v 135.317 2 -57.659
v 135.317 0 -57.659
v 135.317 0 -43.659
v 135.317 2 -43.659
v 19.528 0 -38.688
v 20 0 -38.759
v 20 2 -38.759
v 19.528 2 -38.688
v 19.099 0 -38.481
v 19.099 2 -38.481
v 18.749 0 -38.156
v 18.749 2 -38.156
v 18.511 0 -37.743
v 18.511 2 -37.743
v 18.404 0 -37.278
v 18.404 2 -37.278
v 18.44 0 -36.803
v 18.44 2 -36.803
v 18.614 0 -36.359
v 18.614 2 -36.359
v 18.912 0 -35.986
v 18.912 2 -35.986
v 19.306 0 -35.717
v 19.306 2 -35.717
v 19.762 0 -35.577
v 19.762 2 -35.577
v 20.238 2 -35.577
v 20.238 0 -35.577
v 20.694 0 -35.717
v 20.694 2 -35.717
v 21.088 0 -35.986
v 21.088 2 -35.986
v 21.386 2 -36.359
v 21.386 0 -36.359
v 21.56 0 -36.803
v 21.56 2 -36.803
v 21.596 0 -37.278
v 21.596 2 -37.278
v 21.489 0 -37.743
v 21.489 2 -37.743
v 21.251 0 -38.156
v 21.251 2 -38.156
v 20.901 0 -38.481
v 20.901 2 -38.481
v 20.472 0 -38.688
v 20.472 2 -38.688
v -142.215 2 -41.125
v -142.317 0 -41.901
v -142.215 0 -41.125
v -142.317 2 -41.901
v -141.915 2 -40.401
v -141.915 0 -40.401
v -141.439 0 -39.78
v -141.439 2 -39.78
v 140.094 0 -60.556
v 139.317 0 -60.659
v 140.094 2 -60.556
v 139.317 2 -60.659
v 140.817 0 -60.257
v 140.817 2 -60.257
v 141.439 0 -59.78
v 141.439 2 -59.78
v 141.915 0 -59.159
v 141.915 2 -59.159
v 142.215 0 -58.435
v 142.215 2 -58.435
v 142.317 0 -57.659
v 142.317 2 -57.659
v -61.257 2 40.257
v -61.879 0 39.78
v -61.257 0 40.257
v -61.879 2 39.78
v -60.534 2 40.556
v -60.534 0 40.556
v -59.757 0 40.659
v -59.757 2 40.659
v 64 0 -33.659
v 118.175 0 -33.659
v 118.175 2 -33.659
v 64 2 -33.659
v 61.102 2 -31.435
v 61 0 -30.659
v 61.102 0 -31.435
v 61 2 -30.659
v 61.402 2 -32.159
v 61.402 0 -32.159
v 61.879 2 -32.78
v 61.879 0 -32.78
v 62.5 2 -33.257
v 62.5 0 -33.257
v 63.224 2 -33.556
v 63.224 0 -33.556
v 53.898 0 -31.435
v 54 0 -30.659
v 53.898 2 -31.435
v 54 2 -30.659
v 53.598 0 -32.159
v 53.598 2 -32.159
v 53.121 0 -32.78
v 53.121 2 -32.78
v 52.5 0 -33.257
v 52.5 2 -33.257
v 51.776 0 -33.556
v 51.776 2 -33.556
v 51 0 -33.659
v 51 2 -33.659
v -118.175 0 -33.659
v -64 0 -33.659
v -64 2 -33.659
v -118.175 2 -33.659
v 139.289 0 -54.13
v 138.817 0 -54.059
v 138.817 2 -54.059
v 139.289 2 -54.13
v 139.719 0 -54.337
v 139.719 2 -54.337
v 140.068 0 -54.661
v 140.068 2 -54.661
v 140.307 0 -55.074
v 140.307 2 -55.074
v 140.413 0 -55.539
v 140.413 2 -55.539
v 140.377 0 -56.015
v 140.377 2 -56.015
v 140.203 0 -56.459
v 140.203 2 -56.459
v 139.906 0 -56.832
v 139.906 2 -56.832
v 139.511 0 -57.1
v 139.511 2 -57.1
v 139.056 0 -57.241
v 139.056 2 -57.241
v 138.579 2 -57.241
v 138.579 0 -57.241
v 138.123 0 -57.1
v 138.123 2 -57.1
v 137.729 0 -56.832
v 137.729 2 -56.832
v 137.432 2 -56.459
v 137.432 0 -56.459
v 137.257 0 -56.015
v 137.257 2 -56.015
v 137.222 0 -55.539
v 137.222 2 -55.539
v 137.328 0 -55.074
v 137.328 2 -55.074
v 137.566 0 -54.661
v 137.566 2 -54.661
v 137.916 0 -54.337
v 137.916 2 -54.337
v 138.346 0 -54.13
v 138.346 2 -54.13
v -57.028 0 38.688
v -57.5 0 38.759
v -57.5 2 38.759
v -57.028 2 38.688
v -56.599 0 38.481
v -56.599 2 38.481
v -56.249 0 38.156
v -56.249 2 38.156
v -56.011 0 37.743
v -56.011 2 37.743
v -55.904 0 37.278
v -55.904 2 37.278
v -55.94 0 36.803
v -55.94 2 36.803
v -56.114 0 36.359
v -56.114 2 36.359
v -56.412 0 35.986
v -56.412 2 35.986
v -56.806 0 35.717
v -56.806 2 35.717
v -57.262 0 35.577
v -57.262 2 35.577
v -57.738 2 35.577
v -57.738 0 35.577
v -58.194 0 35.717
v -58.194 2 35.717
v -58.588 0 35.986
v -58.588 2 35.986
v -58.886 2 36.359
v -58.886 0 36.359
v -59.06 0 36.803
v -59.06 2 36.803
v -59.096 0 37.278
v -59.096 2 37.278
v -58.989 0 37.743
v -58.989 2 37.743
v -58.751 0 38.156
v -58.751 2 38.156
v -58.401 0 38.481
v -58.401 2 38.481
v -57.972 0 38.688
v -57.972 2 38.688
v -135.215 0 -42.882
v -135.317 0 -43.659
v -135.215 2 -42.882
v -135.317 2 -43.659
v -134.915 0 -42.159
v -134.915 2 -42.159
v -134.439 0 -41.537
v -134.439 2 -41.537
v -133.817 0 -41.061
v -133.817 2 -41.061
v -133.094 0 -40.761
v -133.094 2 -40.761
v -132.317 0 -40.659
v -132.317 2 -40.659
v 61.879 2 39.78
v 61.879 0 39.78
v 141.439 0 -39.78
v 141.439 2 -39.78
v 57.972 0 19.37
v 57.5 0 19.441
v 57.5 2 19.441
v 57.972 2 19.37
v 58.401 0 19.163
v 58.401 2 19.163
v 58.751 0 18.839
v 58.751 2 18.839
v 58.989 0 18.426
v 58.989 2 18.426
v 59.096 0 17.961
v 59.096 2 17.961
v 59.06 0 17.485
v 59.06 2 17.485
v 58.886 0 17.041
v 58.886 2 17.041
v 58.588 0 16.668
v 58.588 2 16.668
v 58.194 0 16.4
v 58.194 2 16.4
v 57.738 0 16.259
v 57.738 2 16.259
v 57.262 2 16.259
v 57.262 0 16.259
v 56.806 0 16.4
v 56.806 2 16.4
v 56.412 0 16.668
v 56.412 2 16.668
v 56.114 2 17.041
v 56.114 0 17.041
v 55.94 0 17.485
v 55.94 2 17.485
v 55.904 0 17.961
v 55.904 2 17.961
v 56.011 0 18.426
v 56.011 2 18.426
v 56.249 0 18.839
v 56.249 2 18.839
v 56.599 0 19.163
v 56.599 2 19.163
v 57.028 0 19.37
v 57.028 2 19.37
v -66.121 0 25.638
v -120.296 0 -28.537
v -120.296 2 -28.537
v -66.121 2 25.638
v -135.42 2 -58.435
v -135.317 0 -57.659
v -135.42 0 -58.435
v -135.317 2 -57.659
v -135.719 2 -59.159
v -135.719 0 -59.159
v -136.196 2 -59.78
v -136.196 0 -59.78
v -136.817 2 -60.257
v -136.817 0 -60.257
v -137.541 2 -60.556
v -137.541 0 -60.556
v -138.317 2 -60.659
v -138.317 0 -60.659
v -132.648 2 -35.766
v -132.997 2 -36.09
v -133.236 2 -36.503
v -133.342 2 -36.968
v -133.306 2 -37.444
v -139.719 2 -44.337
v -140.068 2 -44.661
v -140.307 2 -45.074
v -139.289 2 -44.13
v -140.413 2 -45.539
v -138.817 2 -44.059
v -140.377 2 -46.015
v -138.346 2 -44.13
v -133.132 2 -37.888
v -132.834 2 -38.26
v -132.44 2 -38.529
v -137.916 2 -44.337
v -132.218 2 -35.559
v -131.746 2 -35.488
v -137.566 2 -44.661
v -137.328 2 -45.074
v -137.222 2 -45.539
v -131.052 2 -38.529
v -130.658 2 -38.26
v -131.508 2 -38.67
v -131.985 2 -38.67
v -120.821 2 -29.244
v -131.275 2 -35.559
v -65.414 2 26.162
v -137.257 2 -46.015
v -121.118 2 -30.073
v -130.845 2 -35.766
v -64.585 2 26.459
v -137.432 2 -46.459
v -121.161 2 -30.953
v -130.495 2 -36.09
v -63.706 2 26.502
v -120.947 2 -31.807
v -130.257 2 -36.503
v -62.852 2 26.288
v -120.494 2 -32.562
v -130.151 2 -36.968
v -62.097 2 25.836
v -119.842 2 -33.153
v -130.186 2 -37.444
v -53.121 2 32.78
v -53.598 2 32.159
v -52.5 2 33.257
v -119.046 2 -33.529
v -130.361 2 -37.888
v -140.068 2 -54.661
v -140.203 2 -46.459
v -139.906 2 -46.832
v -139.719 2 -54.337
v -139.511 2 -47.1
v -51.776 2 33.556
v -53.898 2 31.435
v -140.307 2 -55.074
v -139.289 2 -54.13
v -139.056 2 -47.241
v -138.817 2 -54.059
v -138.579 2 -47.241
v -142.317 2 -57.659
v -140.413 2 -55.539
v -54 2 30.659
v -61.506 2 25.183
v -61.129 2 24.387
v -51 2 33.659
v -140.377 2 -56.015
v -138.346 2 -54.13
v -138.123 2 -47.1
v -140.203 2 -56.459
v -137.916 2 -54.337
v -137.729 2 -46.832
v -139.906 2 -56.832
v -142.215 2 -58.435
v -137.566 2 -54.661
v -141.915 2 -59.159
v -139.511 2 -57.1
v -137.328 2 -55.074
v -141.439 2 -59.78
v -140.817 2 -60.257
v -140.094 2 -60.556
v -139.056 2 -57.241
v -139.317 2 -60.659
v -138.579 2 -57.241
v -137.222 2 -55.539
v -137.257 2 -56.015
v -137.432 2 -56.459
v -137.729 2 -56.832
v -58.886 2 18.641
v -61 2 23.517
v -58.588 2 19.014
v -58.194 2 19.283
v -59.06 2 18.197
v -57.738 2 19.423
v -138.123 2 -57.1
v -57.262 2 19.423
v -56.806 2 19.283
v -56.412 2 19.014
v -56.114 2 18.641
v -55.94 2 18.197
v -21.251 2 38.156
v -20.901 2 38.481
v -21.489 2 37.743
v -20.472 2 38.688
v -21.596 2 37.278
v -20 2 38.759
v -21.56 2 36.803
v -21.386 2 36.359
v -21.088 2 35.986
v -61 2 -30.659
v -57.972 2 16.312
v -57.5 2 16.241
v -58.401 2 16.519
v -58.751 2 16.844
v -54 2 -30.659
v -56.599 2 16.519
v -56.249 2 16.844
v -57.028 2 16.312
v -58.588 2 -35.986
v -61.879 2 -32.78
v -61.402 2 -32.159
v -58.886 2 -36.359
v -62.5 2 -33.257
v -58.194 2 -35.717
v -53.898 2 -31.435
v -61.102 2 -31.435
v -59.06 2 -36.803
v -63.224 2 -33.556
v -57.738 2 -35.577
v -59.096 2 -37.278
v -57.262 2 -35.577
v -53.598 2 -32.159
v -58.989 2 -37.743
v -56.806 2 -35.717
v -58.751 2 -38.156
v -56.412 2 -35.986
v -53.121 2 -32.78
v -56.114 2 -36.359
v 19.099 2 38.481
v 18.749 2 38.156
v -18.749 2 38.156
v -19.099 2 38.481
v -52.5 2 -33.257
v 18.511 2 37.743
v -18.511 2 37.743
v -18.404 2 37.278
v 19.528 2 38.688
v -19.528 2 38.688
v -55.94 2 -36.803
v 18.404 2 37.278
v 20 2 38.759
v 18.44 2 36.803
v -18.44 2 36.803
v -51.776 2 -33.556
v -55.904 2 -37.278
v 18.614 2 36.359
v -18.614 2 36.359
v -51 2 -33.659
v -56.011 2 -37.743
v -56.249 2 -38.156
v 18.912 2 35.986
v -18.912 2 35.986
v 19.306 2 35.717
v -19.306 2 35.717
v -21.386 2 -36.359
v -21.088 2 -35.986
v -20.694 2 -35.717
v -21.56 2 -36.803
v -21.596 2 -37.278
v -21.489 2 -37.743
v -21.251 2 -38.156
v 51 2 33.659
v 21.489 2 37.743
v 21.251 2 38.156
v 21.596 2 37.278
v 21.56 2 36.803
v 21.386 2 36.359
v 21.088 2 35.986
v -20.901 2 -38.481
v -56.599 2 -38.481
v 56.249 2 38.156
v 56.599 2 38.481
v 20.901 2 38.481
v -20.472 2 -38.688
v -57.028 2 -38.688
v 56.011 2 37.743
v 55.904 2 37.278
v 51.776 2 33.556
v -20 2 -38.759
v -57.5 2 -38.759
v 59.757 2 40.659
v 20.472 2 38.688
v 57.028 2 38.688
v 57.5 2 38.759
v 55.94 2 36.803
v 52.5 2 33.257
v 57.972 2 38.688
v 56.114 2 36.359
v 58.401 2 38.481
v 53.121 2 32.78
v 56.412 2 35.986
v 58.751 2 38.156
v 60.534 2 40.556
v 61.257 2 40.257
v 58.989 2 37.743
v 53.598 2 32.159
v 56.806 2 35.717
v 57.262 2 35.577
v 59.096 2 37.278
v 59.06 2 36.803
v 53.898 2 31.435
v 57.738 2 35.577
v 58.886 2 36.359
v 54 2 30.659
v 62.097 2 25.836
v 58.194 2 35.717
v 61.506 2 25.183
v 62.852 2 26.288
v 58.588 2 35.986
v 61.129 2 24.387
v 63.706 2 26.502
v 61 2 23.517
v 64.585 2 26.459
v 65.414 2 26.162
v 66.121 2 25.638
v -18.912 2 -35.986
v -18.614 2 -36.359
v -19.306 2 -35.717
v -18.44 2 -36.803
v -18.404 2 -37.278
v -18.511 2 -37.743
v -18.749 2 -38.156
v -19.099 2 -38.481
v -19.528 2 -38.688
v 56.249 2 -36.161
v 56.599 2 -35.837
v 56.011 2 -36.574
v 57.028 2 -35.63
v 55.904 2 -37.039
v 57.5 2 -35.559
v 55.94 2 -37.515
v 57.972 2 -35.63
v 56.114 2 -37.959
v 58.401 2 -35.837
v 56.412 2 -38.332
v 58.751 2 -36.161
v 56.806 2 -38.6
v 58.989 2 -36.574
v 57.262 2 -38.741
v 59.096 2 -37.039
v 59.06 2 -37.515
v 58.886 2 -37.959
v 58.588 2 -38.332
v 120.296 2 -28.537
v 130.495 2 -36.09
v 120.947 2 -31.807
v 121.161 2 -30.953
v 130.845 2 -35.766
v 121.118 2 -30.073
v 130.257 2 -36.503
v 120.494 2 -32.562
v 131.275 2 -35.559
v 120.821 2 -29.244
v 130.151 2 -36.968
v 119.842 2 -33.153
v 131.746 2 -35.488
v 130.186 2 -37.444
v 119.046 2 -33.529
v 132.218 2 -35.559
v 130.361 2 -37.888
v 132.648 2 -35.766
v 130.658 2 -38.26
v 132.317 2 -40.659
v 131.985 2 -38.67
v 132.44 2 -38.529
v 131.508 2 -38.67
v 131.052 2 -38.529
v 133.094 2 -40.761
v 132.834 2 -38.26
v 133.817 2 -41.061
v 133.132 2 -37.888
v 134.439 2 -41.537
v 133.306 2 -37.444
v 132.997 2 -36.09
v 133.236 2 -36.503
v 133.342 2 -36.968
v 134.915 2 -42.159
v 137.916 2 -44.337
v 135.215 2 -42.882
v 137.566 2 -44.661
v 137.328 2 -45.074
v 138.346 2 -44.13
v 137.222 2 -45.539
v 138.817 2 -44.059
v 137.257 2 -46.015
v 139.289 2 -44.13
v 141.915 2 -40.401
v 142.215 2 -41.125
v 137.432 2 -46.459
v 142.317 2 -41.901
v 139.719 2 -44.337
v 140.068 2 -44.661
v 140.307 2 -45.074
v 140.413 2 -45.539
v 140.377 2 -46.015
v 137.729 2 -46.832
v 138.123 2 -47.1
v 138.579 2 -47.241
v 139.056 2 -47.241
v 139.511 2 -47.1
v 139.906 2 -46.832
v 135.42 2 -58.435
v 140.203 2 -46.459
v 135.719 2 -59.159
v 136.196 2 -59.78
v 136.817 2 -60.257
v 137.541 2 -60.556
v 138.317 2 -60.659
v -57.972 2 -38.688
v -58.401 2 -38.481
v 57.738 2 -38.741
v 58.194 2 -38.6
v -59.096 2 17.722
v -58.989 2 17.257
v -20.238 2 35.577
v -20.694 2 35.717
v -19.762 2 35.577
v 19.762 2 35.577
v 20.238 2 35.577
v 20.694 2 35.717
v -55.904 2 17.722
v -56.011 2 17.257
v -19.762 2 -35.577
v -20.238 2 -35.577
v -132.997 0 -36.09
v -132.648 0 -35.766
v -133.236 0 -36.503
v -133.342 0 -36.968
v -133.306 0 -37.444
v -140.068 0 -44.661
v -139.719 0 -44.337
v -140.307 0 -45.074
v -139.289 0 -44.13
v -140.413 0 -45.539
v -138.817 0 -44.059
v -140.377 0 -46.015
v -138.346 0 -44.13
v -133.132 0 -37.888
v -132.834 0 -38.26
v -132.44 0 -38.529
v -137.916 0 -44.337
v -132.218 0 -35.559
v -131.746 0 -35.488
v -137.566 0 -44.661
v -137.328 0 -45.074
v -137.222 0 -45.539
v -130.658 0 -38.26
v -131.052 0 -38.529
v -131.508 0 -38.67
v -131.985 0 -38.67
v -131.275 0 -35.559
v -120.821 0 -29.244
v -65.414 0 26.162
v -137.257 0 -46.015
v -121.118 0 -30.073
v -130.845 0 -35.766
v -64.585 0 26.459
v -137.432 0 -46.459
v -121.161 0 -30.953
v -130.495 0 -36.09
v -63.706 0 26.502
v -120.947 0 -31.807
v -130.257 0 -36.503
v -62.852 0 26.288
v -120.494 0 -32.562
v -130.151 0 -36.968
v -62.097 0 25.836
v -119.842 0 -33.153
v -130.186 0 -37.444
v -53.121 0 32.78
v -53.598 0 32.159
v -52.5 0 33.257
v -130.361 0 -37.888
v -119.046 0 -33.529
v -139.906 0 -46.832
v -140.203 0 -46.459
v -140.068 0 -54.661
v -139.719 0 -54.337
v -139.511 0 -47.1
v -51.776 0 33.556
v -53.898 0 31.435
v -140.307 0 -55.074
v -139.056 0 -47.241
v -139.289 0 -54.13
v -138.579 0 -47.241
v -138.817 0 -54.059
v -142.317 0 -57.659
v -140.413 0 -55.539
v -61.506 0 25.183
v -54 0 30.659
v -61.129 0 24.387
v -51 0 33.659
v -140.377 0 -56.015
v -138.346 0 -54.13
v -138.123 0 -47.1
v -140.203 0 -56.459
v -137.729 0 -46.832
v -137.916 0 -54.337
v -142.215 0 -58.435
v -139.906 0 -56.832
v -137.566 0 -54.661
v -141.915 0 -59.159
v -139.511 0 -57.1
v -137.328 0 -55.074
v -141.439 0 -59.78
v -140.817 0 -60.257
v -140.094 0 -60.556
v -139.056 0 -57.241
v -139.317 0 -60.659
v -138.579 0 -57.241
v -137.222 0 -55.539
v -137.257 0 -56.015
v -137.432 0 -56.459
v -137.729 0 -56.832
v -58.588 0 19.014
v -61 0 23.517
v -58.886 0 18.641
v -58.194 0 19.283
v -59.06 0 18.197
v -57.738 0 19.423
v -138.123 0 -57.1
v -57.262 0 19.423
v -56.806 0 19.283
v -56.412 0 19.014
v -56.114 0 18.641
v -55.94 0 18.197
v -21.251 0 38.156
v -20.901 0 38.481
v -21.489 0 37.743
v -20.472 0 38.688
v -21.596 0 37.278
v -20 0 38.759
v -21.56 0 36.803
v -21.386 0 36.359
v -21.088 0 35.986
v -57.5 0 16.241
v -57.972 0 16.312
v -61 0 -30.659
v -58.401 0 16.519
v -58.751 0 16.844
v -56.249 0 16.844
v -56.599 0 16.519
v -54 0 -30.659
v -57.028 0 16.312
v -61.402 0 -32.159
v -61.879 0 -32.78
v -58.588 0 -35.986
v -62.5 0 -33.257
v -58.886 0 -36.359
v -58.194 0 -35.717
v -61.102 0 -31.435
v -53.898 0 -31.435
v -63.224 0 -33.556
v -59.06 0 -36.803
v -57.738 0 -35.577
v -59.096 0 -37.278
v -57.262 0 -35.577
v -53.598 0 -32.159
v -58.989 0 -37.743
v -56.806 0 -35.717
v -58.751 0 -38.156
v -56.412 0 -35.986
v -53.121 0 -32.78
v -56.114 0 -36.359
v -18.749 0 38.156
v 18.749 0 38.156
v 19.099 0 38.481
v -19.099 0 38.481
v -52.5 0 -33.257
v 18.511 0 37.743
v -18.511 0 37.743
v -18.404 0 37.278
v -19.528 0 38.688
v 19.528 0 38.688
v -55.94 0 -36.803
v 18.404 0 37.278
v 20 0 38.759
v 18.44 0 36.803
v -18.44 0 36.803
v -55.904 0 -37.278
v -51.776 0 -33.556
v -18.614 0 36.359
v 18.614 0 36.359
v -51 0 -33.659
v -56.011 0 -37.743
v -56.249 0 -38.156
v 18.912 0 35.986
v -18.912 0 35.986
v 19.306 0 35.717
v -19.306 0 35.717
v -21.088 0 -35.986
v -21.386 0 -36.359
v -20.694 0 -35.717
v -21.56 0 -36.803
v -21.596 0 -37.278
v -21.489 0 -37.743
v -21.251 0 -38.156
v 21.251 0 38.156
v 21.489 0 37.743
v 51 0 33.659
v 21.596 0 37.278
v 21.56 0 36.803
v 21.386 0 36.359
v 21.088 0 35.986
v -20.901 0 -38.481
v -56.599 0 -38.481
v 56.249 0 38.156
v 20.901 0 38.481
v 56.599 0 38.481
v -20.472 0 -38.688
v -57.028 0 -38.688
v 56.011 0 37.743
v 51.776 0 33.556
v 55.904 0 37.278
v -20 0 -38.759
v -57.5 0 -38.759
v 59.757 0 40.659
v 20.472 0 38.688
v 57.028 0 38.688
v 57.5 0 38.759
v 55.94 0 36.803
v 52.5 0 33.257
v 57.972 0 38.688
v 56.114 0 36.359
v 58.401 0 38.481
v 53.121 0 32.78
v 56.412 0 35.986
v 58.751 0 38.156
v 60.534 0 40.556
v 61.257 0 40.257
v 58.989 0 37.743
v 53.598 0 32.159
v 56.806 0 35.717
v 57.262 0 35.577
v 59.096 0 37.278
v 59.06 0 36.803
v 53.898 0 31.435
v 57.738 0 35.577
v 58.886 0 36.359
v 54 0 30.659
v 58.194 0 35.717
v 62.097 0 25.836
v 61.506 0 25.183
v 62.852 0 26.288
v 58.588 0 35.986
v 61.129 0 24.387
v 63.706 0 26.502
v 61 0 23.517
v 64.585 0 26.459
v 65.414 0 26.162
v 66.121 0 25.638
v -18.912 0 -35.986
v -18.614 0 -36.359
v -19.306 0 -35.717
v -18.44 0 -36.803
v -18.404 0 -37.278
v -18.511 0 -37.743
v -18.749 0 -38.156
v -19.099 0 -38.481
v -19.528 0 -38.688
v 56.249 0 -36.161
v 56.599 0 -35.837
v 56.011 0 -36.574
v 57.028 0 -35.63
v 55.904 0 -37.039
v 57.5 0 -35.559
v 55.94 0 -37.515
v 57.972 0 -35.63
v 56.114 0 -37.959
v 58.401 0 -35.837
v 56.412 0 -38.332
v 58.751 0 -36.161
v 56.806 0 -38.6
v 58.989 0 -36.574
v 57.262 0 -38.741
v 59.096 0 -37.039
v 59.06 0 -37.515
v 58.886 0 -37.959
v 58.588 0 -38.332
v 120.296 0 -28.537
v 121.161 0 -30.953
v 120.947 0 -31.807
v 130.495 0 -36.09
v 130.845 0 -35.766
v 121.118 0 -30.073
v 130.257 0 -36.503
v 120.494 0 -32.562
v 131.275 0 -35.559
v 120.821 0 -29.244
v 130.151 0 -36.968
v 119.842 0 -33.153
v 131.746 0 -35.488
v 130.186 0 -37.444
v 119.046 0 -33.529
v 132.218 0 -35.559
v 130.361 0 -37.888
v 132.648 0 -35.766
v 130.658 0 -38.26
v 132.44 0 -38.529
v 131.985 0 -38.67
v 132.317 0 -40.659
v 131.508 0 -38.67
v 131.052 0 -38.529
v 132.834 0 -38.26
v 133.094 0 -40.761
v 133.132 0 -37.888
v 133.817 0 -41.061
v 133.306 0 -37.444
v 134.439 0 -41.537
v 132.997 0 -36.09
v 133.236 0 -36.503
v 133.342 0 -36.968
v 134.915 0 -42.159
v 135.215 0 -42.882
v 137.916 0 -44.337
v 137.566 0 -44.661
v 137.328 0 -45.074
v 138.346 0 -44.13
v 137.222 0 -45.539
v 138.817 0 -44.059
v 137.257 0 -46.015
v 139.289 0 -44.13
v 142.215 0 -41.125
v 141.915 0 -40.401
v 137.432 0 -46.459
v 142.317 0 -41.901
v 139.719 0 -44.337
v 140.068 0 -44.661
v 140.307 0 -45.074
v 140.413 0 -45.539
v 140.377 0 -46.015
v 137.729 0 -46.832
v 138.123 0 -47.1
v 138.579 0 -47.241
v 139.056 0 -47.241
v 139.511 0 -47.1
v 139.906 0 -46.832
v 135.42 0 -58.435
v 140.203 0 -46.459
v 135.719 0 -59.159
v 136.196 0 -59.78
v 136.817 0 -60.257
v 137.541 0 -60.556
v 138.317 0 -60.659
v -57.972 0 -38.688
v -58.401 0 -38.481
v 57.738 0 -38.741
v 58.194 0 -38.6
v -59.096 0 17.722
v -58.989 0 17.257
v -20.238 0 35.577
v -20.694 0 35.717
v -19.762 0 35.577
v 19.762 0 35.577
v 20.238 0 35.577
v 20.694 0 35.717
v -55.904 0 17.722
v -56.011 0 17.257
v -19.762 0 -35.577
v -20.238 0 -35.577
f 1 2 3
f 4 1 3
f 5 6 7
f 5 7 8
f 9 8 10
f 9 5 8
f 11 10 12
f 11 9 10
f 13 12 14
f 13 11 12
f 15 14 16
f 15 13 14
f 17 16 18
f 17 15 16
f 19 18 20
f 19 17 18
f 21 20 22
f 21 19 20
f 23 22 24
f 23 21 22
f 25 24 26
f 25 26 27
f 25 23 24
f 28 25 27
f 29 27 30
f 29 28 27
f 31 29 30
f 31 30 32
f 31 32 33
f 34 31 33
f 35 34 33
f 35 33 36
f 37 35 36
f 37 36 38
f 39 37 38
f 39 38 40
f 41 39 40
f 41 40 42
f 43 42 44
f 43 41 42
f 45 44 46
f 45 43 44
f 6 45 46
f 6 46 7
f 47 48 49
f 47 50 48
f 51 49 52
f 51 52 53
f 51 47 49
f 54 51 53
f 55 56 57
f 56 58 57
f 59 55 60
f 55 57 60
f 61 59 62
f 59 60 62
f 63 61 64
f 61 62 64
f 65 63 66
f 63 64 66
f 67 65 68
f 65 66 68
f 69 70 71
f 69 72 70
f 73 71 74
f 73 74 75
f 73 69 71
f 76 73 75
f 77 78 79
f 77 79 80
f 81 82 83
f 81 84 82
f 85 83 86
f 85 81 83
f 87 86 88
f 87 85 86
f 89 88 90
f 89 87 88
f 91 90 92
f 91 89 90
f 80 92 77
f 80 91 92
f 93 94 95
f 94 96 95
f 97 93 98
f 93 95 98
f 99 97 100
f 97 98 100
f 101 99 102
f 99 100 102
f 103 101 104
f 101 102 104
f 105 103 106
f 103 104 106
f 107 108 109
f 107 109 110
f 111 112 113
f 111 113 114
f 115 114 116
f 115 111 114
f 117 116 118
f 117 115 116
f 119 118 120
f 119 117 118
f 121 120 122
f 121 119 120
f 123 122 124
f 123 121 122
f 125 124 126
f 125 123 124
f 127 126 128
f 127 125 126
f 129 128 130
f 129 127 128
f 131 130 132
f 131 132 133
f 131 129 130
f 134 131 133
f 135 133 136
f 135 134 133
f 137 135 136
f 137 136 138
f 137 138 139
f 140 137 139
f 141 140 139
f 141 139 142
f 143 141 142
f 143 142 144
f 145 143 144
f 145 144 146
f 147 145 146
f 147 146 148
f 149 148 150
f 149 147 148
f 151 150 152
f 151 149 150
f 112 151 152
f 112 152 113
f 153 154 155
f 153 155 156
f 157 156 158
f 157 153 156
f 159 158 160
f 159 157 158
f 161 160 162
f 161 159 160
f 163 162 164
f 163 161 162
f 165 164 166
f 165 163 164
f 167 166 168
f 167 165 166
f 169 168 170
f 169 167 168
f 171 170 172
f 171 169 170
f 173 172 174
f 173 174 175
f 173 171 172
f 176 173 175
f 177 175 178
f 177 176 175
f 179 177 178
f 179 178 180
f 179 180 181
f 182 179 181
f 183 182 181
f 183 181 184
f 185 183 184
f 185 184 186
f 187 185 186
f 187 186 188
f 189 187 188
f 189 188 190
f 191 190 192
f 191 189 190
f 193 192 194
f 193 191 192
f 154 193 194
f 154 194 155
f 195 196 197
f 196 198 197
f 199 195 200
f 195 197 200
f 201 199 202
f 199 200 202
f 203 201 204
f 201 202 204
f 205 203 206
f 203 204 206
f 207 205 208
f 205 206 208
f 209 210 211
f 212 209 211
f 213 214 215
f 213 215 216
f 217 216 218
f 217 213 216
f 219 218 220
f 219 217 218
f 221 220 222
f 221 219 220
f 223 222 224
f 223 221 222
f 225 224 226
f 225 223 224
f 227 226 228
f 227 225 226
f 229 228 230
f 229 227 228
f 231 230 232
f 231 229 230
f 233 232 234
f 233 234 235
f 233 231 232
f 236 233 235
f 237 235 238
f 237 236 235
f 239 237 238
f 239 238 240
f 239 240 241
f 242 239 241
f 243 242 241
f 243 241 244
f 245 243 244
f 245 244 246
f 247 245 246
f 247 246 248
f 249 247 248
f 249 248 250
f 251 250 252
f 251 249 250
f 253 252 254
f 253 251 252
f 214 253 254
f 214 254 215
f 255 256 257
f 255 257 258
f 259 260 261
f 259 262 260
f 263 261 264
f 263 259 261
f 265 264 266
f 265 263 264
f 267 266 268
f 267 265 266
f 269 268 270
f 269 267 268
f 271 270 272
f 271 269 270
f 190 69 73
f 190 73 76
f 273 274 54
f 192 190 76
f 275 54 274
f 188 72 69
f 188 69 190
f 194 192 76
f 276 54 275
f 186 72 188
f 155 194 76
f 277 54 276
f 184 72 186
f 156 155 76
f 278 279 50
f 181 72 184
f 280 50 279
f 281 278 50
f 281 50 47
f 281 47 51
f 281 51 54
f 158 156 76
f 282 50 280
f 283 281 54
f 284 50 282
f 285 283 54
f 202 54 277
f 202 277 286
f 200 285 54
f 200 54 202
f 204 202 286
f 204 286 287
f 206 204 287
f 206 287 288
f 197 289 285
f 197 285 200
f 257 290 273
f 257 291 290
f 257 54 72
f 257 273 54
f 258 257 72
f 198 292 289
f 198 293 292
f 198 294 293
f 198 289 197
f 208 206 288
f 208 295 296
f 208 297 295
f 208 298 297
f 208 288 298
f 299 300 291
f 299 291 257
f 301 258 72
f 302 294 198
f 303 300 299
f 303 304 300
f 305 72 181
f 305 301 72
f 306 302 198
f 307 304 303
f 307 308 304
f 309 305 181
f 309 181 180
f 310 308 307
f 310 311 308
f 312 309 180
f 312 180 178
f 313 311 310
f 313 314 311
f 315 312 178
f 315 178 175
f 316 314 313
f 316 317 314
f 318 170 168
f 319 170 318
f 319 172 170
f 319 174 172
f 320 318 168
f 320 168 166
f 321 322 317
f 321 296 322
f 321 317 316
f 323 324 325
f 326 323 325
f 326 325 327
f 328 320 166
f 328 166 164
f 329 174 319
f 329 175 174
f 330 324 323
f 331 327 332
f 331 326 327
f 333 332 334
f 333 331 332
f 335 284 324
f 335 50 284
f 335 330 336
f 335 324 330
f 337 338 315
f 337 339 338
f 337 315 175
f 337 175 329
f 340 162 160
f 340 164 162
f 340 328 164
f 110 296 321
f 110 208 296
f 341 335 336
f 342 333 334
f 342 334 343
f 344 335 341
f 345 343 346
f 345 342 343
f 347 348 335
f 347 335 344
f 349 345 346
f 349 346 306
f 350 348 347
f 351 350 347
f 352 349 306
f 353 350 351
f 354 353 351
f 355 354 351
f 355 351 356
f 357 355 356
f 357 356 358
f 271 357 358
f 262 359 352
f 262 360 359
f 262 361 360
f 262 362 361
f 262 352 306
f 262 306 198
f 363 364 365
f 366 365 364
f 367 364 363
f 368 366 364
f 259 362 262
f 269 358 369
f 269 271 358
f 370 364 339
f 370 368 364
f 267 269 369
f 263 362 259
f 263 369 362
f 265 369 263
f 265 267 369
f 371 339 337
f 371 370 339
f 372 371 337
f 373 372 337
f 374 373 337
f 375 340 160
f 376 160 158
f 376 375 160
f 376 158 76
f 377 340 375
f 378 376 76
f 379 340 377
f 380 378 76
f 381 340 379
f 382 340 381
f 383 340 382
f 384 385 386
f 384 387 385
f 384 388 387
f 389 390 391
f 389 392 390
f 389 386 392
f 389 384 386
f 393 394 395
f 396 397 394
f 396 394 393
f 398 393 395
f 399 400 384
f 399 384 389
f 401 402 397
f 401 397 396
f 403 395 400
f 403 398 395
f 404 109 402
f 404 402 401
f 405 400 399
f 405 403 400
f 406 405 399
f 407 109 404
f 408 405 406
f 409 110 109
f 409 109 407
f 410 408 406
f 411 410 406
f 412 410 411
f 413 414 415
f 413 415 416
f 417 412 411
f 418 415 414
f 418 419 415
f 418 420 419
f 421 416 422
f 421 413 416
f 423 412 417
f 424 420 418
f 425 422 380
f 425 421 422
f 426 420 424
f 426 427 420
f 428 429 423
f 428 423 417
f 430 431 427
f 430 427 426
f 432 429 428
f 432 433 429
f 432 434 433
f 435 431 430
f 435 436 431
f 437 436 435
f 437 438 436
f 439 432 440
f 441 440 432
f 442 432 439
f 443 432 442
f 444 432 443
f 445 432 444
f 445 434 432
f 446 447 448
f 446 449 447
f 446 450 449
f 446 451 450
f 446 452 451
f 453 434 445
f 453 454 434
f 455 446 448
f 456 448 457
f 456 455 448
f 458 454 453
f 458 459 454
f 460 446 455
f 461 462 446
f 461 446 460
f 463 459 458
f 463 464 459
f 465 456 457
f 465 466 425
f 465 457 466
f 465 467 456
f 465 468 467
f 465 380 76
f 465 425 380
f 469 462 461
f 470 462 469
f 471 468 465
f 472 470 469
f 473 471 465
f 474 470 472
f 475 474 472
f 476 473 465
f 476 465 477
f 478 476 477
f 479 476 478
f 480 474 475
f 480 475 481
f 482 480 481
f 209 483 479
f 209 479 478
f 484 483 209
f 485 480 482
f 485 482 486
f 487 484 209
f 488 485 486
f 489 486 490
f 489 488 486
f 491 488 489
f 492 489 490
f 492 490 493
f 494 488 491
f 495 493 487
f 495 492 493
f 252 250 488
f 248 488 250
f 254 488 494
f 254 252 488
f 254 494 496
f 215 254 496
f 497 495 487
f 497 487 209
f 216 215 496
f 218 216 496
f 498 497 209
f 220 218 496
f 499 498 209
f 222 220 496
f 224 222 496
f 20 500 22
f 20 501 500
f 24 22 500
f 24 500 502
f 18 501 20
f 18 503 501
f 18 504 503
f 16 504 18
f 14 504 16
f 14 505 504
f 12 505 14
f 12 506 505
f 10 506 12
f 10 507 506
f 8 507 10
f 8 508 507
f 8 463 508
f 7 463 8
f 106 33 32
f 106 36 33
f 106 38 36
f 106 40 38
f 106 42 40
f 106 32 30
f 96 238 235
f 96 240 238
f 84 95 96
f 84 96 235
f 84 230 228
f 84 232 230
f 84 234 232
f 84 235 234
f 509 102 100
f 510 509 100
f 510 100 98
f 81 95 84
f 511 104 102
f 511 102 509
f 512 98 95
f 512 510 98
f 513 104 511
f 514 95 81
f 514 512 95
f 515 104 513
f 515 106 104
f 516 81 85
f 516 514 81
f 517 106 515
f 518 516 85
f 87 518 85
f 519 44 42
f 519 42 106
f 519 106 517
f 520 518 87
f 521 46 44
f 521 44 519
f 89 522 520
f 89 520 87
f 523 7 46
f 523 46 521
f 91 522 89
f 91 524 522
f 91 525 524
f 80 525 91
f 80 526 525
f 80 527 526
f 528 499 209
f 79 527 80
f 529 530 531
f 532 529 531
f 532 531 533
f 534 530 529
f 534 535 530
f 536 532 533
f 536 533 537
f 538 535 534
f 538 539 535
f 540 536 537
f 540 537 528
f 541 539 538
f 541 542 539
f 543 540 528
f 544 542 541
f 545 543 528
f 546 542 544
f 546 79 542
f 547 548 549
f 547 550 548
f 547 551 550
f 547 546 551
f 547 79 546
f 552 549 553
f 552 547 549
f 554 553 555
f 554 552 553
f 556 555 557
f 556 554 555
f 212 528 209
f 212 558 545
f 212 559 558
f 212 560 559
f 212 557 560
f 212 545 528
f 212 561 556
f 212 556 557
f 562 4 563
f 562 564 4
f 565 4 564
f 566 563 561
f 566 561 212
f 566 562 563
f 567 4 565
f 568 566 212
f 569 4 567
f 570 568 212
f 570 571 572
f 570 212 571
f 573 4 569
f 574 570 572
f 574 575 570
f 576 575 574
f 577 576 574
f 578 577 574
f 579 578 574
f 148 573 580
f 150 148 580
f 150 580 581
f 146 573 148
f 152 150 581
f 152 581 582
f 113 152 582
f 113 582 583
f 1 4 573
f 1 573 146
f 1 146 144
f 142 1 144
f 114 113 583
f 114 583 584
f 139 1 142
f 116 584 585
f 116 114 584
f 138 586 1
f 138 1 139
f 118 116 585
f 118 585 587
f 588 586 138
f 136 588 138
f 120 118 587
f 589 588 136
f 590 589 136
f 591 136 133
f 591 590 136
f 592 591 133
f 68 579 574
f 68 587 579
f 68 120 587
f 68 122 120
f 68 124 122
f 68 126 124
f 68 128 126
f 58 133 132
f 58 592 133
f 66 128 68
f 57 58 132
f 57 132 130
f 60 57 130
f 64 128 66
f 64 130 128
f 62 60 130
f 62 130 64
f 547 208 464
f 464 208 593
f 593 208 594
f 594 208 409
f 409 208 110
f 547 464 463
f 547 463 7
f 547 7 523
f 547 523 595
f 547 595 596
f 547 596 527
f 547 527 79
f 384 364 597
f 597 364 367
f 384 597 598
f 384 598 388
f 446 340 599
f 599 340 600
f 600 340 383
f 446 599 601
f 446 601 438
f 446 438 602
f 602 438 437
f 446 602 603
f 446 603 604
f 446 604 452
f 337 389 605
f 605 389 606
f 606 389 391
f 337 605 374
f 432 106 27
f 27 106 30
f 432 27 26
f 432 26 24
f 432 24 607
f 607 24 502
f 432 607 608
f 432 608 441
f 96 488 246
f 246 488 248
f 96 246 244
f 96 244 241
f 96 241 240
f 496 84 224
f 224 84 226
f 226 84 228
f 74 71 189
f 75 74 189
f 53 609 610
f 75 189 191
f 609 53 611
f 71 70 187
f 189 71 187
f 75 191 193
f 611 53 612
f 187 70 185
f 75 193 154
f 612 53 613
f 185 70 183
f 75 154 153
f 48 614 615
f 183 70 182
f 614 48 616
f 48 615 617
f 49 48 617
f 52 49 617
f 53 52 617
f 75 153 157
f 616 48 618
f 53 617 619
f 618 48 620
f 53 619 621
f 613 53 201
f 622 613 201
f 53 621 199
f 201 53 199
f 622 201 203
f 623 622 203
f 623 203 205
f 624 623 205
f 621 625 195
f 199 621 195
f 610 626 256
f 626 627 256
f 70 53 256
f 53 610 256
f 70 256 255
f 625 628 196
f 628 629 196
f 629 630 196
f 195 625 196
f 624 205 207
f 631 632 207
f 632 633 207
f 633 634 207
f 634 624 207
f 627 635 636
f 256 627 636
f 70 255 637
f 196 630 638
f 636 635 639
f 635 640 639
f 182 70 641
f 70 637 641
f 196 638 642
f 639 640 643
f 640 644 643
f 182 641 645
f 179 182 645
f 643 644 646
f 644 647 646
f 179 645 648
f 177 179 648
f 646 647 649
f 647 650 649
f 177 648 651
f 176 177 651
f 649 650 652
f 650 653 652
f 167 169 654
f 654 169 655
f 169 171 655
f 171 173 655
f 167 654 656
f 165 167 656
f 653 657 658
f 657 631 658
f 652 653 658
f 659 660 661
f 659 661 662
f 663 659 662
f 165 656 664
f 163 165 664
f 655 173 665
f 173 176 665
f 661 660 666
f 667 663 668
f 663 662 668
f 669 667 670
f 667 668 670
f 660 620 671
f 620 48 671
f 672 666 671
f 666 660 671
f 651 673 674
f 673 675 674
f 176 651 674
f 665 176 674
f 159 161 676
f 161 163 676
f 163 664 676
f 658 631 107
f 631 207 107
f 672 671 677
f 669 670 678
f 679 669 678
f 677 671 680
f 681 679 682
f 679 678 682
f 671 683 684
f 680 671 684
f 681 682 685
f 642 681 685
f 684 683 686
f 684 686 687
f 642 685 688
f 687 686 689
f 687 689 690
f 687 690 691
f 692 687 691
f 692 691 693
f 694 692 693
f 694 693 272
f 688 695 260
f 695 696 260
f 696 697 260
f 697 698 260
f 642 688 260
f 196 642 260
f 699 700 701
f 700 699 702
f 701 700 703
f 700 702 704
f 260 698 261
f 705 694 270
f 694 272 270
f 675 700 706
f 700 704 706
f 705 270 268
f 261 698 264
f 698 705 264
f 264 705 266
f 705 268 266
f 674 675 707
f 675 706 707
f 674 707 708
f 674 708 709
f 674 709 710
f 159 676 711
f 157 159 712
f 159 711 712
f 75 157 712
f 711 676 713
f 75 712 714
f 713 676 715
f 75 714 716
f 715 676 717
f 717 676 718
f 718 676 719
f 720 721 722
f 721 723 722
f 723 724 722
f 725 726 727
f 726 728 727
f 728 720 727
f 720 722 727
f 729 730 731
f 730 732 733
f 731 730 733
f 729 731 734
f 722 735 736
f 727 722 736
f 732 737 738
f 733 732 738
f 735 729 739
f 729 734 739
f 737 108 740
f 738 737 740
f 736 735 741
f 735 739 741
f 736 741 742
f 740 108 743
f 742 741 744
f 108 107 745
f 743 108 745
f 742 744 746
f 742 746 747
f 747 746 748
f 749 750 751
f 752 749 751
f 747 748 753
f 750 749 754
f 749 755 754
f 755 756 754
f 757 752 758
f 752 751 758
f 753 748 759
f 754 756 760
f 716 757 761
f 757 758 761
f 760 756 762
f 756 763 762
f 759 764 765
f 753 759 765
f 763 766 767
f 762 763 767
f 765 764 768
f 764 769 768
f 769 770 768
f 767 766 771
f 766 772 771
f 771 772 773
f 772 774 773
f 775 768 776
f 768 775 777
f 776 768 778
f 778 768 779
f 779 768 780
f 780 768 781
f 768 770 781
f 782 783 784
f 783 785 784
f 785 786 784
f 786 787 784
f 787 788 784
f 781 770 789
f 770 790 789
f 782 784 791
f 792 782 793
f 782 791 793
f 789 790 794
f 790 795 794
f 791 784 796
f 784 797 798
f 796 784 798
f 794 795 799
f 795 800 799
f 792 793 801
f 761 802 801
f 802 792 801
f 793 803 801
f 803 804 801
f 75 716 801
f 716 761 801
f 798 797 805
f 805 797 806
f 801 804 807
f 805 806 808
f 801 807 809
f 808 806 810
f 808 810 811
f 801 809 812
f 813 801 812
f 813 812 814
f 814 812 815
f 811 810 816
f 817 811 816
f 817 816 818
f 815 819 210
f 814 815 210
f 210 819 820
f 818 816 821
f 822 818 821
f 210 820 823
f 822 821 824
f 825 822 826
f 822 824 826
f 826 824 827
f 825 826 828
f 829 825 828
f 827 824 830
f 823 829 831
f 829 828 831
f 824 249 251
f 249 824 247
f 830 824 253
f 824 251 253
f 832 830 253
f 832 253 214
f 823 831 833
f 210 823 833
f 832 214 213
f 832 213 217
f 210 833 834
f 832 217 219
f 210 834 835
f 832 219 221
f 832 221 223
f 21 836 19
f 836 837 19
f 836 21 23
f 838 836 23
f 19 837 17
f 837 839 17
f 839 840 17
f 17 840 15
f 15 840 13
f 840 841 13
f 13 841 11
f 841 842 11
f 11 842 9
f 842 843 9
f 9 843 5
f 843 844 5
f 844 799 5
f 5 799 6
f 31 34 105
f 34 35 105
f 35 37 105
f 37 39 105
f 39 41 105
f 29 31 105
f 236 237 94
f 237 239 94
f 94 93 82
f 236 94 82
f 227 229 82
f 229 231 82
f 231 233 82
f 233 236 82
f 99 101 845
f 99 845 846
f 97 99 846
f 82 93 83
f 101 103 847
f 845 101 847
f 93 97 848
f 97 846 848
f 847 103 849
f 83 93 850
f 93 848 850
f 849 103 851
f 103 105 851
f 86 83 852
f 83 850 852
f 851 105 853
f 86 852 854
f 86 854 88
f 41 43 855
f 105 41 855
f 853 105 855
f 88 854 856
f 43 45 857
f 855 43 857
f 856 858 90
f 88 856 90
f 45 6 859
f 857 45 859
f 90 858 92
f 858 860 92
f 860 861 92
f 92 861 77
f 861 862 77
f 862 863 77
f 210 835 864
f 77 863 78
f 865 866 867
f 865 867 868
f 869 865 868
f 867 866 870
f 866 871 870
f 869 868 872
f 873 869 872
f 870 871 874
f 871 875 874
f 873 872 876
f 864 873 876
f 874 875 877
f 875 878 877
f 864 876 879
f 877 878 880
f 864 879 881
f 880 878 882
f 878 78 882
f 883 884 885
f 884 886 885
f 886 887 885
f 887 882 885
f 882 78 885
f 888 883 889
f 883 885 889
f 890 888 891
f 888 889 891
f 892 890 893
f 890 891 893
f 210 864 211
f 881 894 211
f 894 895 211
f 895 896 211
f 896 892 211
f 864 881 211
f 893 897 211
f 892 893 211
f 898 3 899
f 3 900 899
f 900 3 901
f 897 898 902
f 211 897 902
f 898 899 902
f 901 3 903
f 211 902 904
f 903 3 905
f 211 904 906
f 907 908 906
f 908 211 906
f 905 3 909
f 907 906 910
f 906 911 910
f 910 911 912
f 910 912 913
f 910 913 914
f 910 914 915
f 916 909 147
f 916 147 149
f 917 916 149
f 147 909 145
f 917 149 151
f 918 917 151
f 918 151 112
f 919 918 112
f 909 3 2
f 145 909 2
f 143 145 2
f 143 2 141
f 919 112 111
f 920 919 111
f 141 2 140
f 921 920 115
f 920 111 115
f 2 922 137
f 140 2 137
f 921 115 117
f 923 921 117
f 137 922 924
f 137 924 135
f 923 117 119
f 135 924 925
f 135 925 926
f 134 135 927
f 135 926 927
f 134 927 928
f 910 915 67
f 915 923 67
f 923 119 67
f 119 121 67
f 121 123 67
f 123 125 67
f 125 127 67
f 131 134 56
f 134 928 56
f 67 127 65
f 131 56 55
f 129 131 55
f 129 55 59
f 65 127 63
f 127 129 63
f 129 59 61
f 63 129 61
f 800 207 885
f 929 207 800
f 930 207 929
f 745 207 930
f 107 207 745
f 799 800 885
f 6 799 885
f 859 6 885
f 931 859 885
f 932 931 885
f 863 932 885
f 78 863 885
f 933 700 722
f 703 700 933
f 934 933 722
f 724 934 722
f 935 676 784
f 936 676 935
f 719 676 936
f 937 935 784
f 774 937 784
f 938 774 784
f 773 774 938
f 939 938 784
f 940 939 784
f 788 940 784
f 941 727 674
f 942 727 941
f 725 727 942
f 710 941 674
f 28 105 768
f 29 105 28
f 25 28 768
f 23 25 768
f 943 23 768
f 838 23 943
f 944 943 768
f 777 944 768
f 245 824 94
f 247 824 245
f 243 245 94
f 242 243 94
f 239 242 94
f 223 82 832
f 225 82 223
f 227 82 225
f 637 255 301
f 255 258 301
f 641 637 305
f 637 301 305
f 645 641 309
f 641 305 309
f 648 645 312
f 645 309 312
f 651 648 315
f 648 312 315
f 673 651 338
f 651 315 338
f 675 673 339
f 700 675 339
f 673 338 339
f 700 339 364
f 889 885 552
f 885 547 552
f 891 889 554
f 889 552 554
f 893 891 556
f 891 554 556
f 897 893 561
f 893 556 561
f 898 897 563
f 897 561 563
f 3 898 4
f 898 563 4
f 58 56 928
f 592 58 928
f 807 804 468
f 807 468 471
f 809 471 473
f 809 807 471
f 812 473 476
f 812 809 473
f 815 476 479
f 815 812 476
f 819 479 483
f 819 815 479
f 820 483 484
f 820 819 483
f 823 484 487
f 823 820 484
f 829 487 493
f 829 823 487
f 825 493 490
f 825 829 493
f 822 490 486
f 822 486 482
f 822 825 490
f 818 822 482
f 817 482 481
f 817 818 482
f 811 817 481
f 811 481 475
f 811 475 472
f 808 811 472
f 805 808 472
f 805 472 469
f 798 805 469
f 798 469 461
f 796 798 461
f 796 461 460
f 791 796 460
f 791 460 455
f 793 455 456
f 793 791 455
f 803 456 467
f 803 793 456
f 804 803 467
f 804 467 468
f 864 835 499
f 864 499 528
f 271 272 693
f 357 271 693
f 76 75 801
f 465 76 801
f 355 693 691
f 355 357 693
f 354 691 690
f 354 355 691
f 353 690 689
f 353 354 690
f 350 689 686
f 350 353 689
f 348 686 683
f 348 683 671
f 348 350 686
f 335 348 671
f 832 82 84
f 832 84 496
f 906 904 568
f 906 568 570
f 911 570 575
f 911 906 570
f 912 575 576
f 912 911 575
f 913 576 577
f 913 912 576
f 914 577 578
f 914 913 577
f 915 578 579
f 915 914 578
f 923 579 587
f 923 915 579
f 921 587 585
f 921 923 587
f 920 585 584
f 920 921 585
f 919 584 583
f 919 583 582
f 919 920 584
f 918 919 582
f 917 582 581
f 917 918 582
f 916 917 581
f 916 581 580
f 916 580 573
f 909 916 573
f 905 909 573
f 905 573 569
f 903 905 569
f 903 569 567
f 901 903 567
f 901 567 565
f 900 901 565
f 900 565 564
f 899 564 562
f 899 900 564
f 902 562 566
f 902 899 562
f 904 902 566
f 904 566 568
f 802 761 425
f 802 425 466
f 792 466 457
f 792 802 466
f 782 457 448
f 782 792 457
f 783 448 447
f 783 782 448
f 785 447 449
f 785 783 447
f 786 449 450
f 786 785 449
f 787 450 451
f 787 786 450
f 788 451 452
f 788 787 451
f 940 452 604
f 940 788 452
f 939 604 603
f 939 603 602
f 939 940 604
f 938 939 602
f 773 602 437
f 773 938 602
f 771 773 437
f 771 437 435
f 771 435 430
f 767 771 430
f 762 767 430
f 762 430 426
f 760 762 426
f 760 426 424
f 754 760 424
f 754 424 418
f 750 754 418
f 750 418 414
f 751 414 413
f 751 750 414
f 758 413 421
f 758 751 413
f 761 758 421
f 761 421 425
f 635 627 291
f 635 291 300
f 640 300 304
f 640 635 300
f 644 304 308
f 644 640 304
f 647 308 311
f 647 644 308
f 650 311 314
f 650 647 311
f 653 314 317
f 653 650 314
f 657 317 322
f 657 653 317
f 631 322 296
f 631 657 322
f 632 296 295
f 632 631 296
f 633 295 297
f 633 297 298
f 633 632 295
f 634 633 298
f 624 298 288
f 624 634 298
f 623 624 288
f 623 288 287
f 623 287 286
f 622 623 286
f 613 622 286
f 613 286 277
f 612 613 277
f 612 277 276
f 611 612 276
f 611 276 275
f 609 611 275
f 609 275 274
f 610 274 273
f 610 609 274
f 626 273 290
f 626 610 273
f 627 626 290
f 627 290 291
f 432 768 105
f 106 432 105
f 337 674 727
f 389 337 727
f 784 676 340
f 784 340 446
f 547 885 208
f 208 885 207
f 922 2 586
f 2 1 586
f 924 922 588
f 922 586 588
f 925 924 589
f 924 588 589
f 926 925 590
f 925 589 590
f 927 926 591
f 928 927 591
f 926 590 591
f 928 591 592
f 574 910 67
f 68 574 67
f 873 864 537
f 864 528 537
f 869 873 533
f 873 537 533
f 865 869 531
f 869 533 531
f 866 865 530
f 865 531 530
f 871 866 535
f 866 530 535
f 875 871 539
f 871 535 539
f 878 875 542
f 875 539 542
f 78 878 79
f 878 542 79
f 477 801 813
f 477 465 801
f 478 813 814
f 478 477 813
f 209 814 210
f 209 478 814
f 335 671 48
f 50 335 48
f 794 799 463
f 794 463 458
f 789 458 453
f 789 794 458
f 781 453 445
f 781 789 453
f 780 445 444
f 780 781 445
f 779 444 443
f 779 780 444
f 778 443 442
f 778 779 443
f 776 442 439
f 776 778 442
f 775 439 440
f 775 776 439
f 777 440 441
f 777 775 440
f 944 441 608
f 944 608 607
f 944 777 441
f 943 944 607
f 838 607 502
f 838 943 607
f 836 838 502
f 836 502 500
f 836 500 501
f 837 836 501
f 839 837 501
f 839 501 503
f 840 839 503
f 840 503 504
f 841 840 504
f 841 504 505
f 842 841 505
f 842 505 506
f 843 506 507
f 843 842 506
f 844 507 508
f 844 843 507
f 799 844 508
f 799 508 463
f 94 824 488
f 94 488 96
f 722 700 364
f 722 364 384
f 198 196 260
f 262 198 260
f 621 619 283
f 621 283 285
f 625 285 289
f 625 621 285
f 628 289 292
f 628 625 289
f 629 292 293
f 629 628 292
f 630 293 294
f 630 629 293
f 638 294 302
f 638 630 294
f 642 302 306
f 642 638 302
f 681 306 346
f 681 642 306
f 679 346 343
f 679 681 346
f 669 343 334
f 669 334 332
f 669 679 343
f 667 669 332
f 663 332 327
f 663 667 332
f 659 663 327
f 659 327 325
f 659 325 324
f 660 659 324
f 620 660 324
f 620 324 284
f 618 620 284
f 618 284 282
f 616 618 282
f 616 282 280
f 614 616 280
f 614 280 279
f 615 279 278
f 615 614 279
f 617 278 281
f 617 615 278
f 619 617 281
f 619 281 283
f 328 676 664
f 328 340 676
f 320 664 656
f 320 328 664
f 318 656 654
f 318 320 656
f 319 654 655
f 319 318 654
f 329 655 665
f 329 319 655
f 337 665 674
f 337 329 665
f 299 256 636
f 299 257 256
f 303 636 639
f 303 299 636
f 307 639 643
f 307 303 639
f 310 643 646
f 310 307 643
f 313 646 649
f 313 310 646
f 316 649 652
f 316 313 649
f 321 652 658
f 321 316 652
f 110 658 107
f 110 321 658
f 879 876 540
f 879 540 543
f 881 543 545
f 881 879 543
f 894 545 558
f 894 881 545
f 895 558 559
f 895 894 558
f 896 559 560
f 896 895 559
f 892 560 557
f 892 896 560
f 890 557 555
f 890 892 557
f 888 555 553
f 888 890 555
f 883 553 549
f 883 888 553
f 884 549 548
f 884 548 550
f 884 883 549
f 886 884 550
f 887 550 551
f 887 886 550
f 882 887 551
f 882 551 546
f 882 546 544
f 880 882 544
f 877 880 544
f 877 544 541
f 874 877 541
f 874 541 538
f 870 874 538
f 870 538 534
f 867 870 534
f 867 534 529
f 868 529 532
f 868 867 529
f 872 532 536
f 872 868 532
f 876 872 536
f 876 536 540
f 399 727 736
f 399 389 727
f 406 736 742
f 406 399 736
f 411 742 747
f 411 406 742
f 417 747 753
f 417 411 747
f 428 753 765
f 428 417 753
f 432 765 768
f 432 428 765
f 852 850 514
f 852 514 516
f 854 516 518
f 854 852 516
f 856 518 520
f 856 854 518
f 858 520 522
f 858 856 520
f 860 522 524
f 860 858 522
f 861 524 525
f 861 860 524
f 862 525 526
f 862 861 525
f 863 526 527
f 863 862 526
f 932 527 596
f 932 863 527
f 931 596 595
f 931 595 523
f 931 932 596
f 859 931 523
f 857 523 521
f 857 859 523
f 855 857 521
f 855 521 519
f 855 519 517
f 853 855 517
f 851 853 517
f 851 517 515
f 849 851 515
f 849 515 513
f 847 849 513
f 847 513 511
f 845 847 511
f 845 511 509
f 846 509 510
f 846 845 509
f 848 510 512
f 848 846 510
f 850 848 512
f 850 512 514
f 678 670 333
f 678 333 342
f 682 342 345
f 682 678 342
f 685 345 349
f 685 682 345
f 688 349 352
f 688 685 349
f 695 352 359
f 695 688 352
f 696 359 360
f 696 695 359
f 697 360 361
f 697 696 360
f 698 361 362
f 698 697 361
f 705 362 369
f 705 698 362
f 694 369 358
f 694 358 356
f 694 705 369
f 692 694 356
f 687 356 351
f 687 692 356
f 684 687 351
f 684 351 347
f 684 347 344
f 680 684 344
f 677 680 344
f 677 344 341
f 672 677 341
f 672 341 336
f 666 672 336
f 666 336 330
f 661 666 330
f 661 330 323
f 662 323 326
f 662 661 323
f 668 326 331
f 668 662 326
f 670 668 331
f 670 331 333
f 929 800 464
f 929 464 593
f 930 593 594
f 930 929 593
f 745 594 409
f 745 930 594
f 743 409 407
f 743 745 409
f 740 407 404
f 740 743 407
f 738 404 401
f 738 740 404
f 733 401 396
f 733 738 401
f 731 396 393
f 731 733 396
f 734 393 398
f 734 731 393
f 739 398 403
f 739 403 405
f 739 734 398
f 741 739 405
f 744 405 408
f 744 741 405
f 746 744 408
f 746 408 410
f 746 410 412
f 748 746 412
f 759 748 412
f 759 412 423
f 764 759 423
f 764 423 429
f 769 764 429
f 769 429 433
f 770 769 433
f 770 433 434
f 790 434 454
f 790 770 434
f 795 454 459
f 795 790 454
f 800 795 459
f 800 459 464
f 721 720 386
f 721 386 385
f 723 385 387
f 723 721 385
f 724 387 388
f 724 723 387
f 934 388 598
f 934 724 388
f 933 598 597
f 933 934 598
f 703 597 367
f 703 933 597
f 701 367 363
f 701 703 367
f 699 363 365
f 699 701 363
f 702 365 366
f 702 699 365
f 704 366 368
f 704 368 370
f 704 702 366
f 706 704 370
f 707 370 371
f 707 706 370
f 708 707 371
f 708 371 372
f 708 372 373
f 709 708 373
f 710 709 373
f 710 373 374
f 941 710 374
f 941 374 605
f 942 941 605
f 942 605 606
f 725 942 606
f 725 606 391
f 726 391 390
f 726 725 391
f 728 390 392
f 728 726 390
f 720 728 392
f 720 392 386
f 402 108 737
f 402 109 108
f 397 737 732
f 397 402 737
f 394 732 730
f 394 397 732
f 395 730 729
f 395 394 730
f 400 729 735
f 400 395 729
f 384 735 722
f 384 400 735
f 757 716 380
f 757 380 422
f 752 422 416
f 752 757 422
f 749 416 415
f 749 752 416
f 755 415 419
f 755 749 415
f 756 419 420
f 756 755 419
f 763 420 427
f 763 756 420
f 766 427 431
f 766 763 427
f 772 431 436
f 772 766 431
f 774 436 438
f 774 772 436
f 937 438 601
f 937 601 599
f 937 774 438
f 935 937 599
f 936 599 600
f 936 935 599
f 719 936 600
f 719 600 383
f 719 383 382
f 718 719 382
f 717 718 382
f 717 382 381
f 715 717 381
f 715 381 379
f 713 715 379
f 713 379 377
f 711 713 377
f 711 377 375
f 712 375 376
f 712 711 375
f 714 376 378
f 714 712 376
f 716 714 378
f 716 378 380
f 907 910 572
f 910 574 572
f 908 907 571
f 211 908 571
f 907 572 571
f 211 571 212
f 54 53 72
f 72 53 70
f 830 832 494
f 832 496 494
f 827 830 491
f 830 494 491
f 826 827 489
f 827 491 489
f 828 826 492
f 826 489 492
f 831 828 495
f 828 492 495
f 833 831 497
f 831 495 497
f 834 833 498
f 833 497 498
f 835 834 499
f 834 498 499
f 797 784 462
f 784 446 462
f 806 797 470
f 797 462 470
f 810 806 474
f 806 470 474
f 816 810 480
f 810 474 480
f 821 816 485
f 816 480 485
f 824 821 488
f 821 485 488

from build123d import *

# Parameters (mm, degrees)
SKETCH_1_R      = 1.6
SKETCH_1_W      = 108
SKETCH_1_H      = 67.317279836
EXTRUDE_1_DEPTH = 2
FILLET_1_R      = 3


with BuildPart() as part:
    # ｽｹｯﾁ1 → ﾎﾞｽ - 押し出し1 (new body)
    with BuildSketch(Plane(origin=(0, 0, 0), x_dir=(1, 0, 0), z_dir=(0, 1, 0))):
        Polygon((-61, 40.658639918), (-135.317279836, 40.658639918), (-135.317279836, 60.658639918), (-142.317279836, 60.658639918), (-142.317279836, 40.658639918), (-61, -40.658639918), (61, -40.658639918), (142.317279836, 40.658639918), (142.317279836, 60.658639918), (135.317279836, 60.658639918), (135.317279836, 40.658639918), (61, 40.658639918), align=None)
        with Locations(Location((-57.5, -37.158639918, 0), (0, 0, 270))):
            Circle(SKETCH_1_R, mode=Mode.SUBTRACT)
        with Locations(Location((57.5, -37.158639918, 0), (0, 0, 270))):
            Circle(SKETCH_1_R, mode=Mode.SUBTRACT)
        with Locations(Location((-131.746212025, 37.087572106, 0), (0, 0, 270))):
            Circle(SKETCH_1_R, mode=Mode.SUBTRACT)
        with Locations(Location((131.746212025, 37.087572106, 0), (0, 0, 270))):
            Circle(SKETCH_1_R, mode=Mode.SUBTRACT)
        with Locations(Location((20, -37.158639918, 0), (0, 0, 270))):
            Circle(SKETCH_1_R, mode=Mode.SUBTRACT)
        with Locations(Location((-20, -37.158639918, 0), (0, 0, 270))):
            Circle(SKETCH_1_R, mode=Mode.SUBTRACT)
        with Locations(Location((20, 37.158639918, 0), (0, 0, 90))):
            Circle(SKETCH_1_R, mode=Mode.SUBTRACT)
        with Locations(Location((-20, 37.158639918, 0), (0, 0, 90))):
            Circle(SKETCH_1_R, mode=Mode.SUBTRACT)
        with Locations(Location((57.5, 37.158639918, 0), (0, 0, 270))):
            Circle(SKETCH_1_R, mode=Mode.SUBTRACT)
        with Locations(Location((57.5, -17.841360082, 0), (0, 0, 270))):
            Circle(SKETCH_1_R, mode=Mode.SUBTRACT)
        with Locations(Location((-57.5, -17.841360082, 0), (0, 0, 90))):
            Circle(SKETCH_1_R, mode=Mode.SUBTRACT)
        with Locations(Location((-57.5, 37.158639918, 0), (0, 0, 90))):
            Circle(SKETCH_1_R, mode=Mode.SUBTRACT)
        with Locations(Location((138.817279836, 55.658639918, 0), (0, 0, 270))):
            Circle(SKETCH_1_R, mode=Mode.SUBTRACT)
        with Locations(Location((138.817279836, 45.658639918, 0), (0, 0, 270))):
            Circle(SKETCH_1_R, mode=Mode.SUBTRACT)
        with Locations(Location((-138.817279836, 55.658639918, 0), (0, 0, 270))):
            Circle(SKETCH_1_R, mode=Mode.SUBTRACT)
        with Locations(Location((-138.817279836, 45.658639918, 0), (0, 0, 270))):
            Circle(SKETCH_1_R, mode=Mode.SUBTRACT)
        Rectangle(SKETCH_1_W, SKETCH_1_H, mode=Mode.SUBTRACT)
        Polygon((-125.4177849, 33.658639918), (-61, -30.759144982), (-61, 33.658639918), align=None, mode=Mode.SUBTRACT)
        Polygon((61, 33.658639918), (61, -30.759144982), (125.4177849, 33.658639918), align=None, mode=Mode.SUBTRACT)
    extrude(amount=EXTRUDE_1_DEPTH)

    # ﾌｨﾚｯﾄ1
    fillet_1_edges = [part.edges().sort_by_distance(p)[0] for p in [
        (135.317279836, 1, -40.658639918),
        (135.317279836, 1, -60.658639918),
        (142.317279836, 1, -60.658639918),
        (142.317279836, 1, -40.658639918),
        (61, 1, 40.658639918),
        (-61, 1, 40.658639918),
        (-142.317279836, 1, -40.658639918),
        (-142.317279836, 1, -60.658639918),
        (-135.317279836, 1, -60.658639918),
        (-135.317279836, 1, -40.658639918),
        (-54, 1, -33.658639918),
        (-54, 1, 33.658639918),
        (54, 1, 33.658639918),
        (54, 1, -33.658639918),
        (-61, 1, -33.658639918),
        (-125.4177849, 1, -33.658639918),
        (-61, 1, 30.759144982),
        (125.4177849, 1, -33.658639918),
        (61, 1, -33.658639918),
        (61, 1, 30.759144982),
    ]]
    fillet(fillet_1_edges, radius=FILLET_1_R)


solid = part.part
